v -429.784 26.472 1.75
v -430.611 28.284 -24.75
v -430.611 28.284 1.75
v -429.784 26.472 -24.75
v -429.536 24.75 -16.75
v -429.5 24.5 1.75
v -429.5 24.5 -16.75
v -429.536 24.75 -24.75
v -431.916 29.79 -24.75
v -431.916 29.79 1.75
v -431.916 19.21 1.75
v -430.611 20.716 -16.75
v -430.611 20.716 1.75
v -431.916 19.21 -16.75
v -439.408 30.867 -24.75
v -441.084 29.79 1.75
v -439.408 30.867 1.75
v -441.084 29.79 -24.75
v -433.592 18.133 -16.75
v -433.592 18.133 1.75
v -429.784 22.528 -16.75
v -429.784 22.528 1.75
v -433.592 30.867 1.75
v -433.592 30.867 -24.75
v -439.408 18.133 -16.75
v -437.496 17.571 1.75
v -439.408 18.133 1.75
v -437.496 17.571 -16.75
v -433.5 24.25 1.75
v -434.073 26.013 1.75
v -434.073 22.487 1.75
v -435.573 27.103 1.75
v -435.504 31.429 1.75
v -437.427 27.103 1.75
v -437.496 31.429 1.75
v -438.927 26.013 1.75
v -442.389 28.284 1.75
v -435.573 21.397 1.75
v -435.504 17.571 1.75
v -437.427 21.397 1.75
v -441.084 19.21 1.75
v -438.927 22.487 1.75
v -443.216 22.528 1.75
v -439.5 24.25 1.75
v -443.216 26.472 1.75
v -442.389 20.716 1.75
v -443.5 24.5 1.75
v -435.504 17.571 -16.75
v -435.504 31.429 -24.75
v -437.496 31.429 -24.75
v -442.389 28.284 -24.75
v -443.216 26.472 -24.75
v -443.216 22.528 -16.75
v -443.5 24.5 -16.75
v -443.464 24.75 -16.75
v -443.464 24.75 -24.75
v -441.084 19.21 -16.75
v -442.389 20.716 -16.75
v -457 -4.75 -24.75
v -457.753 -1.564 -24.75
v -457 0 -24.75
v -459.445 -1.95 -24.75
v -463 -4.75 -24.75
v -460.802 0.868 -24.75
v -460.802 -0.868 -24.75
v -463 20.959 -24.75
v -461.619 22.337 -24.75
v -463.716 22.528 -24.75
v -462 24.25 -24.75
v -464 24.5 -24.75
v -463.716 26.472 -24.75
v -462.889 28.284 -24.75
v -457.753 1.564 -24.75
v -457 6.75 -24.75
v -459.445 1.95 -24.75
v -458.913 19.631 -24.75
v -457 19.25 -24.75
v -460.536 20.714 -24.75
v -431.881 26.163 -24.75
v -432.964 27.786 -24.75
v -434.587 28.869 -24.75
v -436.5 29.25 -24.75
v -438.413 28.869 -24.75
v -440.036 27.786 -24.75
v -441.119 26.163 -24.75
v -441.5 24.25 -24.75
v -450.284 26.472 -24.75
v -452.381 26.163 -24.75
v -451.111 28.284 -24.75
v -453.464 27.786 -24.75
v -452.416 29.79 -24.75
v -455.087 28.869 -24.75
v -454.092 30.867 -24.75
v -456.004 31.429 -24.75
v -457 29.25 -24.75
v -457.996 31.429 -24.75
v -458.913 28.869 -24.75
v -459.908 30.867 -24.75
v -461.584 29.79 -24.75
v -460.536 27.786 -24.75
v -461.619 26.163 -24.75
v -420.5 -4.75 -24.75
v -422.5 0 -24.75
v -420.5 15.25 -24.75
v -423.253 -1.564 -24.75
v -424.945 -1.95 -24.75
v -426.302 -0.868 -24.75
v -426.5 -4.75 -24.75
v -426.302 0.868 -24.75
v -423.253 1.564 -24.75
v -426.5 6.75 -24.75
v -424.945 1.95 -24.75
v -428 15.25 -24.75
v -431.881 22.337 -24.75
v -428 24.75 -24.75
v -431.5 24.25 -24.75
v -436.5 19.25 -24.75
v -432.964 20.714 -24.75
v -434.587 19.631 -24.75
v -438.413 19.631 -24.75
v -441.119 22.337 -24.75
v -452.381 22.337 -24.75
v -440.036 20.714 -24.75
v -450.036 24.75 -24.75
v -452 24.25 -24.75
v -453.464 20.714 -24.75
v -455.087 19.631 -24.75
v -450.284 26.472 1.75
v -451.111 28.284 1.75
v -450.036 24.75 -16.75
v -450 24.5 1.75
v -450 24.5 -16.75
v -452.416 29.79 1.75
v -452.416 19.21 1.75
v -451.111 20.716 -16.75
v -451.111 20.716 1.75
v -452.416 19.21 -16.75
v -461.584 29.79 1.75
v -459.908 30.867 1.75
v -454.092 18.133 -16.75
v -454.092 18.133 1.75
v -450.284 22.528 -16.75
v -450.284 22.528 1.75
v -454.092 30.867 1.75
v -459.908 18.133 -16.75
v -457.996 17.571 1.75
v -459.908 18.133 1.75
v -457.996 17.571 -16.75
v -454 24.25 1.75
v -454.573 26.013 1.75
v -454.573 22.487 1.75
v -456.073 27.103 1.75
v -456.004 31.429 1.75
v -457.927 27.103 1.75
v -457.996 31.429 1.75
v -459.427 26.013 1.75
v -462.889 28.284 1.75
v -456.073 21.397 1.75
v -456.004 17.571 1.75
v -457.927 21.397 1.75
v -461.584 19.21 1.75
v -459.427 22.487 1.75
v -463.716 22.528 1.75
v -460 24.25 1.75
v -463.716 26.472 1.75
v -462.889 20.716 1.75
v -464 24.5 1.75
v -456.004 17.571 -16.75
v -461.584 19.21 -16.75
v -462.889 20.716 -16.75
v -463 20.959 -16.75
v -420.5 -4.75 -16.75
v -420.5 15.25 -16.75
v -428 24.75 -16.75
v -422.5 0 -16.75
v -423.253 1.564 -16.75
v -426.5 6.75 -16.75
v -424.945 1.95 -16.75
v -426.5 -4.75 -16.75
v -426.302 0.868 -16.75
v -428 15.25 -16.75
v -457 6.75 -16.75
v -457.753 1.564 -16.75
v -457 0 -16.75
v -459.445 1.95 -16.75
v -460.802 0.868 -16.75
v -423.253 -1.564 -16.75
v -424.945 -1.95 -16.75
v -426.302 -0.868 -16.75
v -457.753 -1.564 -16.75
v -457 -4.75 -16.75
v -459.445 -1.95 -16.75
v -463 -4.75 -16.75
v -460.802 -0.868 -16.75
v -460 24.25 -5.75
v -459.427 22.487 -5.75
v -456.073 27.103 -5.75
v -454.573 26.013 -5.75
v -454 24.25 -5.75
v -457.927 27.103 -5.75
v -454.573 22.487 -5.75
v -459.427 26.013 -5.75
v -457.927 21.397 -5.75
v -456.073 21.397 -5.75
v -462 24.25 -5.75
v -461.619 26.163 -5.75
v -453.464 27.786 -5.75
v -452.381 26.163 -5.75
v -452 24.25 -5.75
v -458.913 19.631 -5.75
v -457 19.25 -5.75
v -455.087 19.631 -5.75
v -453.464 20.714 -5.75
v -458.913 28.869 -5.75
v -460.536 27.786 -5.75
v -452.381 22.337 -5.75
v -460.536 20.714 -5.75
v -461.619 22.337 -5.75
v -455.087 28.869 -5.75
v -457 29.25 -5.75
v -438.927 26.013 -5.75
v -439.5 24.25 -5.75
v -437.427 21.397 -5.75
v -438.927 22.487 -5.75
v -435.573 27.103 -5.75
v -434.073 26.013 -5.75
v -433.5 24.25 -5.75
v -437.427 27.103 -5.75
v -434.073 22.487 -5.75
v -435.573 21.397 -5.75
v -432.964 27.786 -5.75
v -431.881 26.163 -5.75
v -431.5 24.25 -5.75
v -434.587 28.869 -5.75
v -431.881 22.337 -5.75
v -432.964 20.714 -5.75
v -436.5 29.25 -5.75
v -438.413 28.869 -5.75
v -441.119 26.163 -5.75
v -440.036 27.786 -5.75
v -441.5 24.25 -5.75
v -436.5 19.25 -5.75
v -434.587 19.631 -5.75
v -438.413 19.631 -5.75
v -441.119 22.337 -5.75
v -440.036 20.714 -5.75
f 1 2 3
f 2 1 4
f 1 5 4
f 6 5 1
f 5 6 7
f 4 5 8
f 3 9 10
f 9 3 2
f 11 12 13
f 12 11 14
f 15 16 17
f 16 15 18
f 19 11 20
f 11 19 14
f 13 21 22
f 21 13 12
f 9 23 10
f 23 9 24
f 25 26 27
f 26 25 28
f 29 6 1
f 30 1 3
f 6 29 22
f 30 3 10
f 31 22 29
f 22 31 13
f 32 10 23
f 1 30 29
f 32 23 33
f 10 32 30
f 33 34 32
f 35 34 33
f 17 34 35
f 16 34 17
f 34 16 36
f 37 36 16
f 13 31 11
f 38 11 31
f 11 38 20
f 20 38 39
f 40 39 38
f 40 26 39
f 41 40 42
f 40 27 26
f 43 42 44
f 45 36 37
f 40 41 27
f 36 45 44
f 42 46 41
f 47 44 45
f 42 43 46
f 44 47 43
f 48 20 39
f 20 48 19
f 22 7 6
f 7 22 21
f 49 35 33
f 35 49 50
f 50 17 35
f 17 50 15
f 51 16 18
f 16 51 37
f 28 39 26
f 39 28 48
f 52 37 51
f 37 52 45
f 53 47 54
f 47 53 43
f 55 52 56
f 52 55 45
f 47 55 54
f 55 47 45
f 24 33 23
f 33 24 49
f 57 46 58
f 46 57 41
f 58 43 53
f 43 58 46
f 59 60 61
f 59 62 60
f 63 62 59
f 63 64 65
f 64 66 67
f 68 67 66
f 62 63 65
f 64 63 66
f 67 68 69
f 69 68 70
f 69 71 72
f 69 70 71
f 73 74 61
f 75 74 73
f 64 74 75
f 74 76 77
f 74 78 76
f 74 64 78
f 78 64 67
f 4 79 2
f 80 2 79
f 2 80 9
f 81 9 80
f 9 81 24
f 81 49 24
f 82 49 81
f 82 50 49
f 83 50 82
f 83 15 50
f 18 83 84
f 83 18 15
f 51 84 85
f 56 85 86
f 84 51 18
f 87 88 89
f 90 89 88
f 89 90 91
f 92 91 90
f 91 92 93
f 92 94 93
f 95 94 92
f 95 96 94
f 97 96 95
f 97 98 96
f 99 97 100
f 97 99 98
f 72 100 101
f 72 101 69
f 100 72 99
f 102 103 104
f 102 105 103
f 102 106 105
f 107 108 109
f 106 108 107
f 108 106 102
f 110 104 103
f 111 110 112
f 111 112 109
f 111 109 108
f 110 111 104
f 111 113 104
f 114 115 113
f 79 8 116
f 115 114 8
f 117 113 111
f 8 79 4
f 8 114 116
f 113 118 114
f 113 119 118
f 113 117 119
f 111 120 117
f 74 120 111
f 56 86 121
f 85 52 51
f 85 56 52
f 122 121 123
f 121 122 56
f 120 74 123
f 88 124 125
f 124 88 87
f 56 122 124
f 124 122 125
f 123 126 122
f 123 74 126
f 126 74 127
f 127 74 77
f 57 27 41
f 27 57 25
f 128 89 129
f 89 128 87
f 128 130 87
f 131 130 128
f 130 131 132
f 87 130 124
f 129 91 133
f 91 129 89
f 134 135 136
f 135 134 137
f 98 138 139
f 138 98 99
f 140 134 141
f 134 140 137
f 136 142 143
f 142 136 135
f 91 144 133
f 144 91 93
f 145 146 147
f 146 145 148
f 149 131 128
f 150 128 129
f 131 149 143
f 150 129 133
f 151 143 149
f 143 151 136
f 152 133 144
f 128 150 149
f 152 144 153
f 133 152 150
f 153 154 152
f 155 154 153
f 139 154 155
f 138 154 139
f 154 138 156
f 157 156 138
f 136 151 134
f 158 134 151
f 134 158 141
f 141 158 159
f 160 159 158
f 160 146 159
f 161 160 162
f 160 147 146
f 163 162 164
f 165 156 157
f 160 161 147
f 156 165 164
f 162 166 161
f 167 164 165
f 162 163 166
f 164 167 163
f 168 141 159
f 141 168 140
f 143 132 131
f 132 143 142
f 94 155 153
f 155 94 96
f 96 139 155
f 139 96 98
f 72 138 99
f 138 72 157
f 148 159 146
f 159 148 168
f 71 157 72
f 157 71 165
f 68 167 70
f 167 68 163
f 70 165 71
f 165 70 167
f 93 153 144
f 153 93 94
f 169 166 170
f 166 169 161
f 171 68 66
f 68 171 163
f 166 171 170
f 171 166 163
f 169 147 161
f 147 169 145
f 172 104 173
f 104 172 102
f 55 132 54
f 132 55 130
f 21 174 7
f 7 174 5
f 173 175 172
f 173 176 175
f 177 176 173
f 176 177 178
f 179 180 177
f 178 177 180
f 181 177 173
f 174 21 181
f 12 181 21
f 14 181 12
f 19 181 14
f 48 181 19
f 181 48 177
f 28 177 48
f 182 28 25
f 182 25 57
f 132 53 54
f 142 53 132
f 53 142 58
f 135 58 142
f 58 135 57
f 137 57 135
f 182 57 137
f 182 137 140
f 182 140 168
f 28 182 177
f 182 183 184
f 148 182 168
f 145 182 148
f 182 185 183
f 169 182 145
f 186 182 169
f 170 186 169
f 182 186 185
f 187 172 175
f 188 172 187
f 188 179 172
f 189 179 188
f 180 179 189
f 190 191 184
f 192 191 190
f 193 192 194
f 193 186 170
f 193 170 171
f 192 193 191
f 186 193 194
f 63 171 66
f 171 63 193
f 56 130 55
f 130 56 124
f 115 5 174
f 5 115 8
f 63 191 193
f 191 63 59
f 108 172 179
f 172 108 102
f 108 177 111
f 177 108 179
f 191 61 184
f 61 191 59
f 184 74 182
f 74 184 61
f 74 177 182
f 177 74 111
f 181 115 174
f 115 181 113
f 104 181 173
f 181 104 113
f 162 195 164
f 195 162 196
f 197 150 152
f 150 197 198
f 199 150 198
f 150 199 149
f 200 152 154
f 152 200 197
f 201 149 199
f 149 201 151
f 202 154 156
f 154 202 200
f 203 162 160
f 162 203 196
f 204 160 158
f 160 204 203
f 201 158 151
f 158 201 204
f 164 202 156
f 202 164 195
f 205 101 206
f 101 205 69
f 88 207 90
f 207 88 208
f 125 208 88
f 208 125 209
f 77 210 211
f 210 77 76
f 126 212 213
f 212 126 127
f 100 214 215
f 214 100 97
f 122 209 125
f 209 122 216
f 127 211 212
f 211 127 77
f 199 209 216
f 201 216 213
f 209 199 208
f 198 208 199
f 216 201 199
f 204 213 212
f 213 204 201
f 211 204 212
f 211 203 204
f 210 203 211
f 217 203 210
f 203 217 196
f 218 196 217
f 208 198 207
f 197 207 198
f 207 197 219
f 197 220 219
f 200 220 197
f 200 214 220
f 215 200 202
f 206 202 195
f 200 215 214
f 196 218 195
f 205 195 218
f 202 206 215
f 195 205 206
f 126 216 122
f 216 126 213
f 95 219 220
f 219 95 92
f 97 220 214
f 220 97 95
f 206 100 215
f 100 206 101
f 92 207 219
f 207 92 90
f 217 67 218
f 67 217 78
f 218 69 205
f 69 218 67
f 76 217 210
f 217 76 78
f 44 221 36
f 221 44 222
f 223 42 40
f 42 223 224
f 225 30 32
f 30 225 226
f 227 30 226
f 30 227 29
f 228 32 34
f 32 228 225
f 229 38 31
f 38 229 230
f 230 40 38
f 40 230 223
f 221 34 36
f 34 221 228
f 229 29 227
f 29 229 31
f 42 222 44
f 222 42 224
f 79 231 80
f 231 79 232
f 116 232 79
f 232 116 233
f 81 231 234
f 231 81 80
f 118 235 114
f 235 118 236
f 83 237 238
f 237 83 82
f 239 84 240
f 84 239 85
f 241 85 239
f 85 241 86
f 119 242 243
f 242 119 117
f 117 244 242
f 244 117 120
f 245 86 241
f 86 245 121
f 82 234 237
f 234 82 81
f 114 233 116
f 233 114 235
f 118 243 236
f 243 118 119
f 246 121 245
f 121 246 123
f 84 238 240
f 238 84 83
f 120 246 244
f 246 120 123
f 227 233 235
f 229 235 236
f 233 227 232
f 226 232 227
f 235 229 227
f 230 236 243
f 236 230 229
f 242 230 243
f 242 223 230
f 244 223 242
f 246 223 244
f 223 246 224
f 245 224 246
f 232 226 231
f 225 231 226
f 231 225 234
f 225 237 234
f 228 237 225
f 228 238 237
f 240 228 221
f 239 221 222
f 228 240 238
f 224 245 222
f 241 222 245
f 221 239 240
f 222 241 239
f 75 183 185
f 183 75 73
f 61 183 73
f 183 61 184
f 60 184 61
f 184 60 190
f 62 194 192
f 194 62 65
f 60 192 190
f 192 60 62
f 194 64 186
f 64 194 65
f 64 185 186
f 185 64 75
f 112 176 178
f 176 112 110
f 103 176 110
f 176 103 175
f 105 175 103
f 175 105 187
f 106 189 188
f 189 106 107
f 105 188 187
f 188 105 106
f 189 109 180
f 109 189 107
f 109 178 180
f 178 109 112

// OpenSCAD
/*
cup_top_radius=46;
cup_bottom_radius=32;
cup_height=114;	
cup_lip=3;	
cup_lip_height=1.5;
cup_radius=cup_top_radius+cup_lip;
s_l=30.5;
s_h=30.5;
s_w=13.5;
s_o=0;
s_r=5;
s_p=7; //offset of pivot point in servo
s_ph=s_p; //servo pivot height

screw_r=2;

horn_r1=2.7;
horn_r2=4.6;
horn_c=2.5;
horn_height=5;
horn_arm=15;*/

cup_top_radius=56;
cup_bottom_radius=32;
cup_height=114;	
cup_lip=3;	
cup_lip_height=0.5;
cup_radius=cup_top_radius+cup_lip;

//s90
/*
s_l=24.5;
s_h=30.5;
s_w=13.5;
s_o=0;
s_r=5;
s_p=7; //offset of pivot point in servo
s_ph=s_p; //servo pivot height


horn_r1=2;
horn_r2=3.9;
horn_c=2.5;
horn_height=5;
horn_arm=13.5;
*/


s_l=30.5;
s_h=30.5;
s_w=13.5;
s_o=0;
s_r=5;
s_p=7; //offset of pivot point in servo
s_ph=s_p; //servo pivot height

horn_r1=2.7;
horn_r2=4.6;
horn_c=2.5;
horn_height=5;
horn_arm=15;

screw_r=3;


module servo() {
    color("black") {
        translate([-s_p,-s_w/2,-s_h-s_ph]) { 
            cube([s_l,s_w,s_h]);
            translate([s_p,s_w/2,s_h]) cylinder(h=s_ph,r1=s_r,r2=s_r);
        }
    }
}

module horn() {
	translate([0,0,-horn_height+horn_c]) {
        hull() {
            translate([-horn_arm-3,0,0]) cylinder(h=horn_height-horn_c,r1=horn_r1,r2=horn_r1);
            translate([horn_arm+3,0,0]) cylinder(h=horn_height-horn_c,r1=horn_r1,r2=horn_r1);
            cylinder(h=horn_height-horn_c,r1=horn_r2,r2=horn_r2);
        }
	}
	translate([0,0,-horn_height]) cylinder(h=horn_height,r1=horn_r2,r2=horn_r2);
}

module ir_sensor_mount2(r=0) {
ir_spacing=36;
ir_width=8;
ir_height=35;
    //top
    difference() {
    rotate([0,r,0])  difference() {
        hull() {
            translate([0,-5,0]) cube([5,10,10]);
            translate([0,-ir_spacing/2-ir_width,ir_height]) cube([5,ir_spacing+2*ir_width,10]);
        }
        //screw holes
        translate([0,ir_spacing/2,ir_spacing+2.5]) rotate([0,90,0]) cylinder(h=50,r1=screw_r-1,r2=screw_r-1);
        translate([0,-ir_spacing/2,ir_spacing+2.5]) rotate([0,90,0]) cylinder(h=50,r1=screw_r-1,r2=screw_r-1);
    }
    
    translate([-10,-10,-10]) cube([20,20,10]);
    }
    //base
    difference() {
        translate([-15,-20,0]) cube([20,40,5]);
        translate([-7,ir_spacing/2-5,-10]) cylinder(h=50,r1=screw_r-1,r2=screw_r-1);
        translate([-7,-(ir_spacing/2-5),-10]) cylinder(h=50,r1=screw_r-1,r2=screw_r-1);
    }
}

module ir_sensor_mount() {
ir_spacing=36;
ir_width=8;
ir_height=35;
difference() {
        union() {
            translate([-3,0,-15]) rotate([0,30,0]) translate([-ir_height+10,-ir_spacing/2-ir_width,0]) cube([ir_height,ir_spacing+2*ir_width,10]);
            translate([-ir_height+10,-ir_spacing/2-ir_width,-ir_width*4]) cube([10,ir_spacing+2*ir_width,ir_width*4]);
        }
        union() {
            //wire spacing
            translate([-ir_height+10,0,-20]) cylinder(h=50,r1=13,r2=13);
            //anchors to toilet
            translate([-40,20,-ir_width*3]) rotate([0,90,0]) cylinder(h=30,r1=screw_r-1,r2=screw_r-1);
            translate([-40,-20,-ir_width*3]) rotate([0,90,0]) cylinder(h=30,r1=screw_r-1,r2=screw_r-1);
            translate([0,ir_spacing/2,-1-15]) rotate([0,30,0]) translate([0,0,-10]) cylinder(h=50,r1=screw_r-1,r2=screw_r-1);
            translate([0,-ir_spacing/2,-1-15])  rotate([0,30,0])  translate([0,0,-10]) cylinder(h=50,r1=screw_r-1,r2=screw_r-1);
        }
}
}

module servo_clamp(clamp_height=15,clamp_width=10) {
    wiggle=3;   
    difference() {
        difference() {
            color("thistle") {
                translate([-s_p-clamp_width+(s_l+clamp_width*2)/2,-5-s_w/2+(s_w+clamp_width-5)/2,-s_h/2-s_ph-clamp_height/2]) translate([0,20+7,clamp_height-wiggle]) {
                    union() {
                        translate([s_l/2-10,0,-(clamp_height-wiggle-4-1)]) cylinder(h=clamp_height+cup_lip_height+wiggle+clamp_height-wiggle-4,r1=7,r2=7);
                        translate([-s_l/2,0,-(clamp_height-wiggle-4-1)]) cylinder(h=clamp_height+cup_lip_height+wiggle+clamp_height-wiggle-4,r1=7,r2=7);
                    }
                }
                translate([-s_p-clamp_width,-s_w/2,-s_h/2-s_ph-clamp_height/2+1]) { 
                    //translate([0,20+7,clamp_height-wiggle]) cube([s_l+clamp_width*2,s_w+clamp_width-5,clamp_height+cup_lip_height+wiggle]);
                    translate([4,2,4]) cube([s_l+clamp_width*2-8,s_w+clamp_width+30-8-9-2-5,clamp_height-wiggle-4]);
                }
            }
            rotate([0,0,0]) servo();
                         
    translate([-s_p-clamp_width,-s_w/2,-s_h/2-s_ph-clamp_height/2]) { 
                    //translate([0,20+7,clamp_height-wiggle]) cube([s_l+clamp_width*2,s_w+clamp_width-5,clamp_height+cup_lip_height+wiggle]);
                    translate([4+35,2+20,4]) cube([10,25,clamp_height-wiggle-4+2]);
                }
        }
        union () {
            translate([-s_p-clamp_width+10,-s_w/2+36-5,-s_h/2-s_ph-clamp_height/2-1]) cylinder(h=50,r1=screw_r,r2=screw_r);
            translate([-s_p-clamp_width+10,-s_w/2+36-5,-s_h/2-s_ph-clamp_height/2-1-25]) cylinder(h=50,r1=screw_r+2,r2=screw_r+2); //bigger hole
            translate([-s_p-clamp_width+(s_l+clamp_width*2)-10-10,-s_w/2+36-5,-s_h/2-s_ph-clamp_height/2-1]) cylinder(h=50,r1=screw_r,r2=screw_r);
            translate([-s_p-clamp_width+(s_l+clamp_width*2)-10-10,-s_w/2+36-5,-s_h/2-s_ph-clamp_height/2-1-25]) cylinder(h=50,r1=screw_r+2,r2=screw_r+2);
            
            translate([-s_p-clamp_width+10-2,0,-s_h/2-s_ph-clamp_height/2-1]) cylinder(h=50,r1=screw_r-1,r2=screw_r-1);
            translate([-s_p-clamp_width+(s_l+clamp_width*2)-10+2,0,-s_h/2-s_ph-clamp_height/2-1]) cylinder(h=50,r1=screw_r-1,r2=screw_r-1);
        }
    }
}

module cup() {
        union() {
            color("red") {
                translate([0,0,-cup_height-cup_lip_height]) {
                        cylinder(h = cup_height, r1 = cup_bottom_radius, r2 = cup_top_radius);
                }
            }   
            color("white") {
                translate([0,0,-cup_lip_height]) cylinder(h = cup_lip_height, r1 = cup_top_radius+cup_lip, r2 = cup_top_radius+cup_lip);
            }
        }   
}


module cup_holder(width=5,nipple=15) {
    color("blue") {
	difference() {
		union() {
			difference() {
				translate([-horn_arm,-horn_r2/2-5,-horn_height]) cube([(horn_arm+5)*2,horn_r2+10,horn_height]);
				horn();
			}
			difference() {
				hull() {
					translate([horn_arm+5+horn_r1+cup_radius,0,0]) {
						translate([0,0,-5]) cylinder(h=5,r1=cup_top_radius+width,r2=cup_top_radius+width);
					}
					//the servo square
					translate([-horn_arm,-horn_r2/2-5,-horn_height]) cube([(horn_arm+5)*2,horn_r2+10,horn_height]);
					//nipple on far side
					translate([horn_arm+5+horn_r1+cup_radius+cup_top_radius,0,-5]) cube([nipple,10,5]);
				}
				//the servo square
				translate([-horn_arm,-horn_r2/2-5,-horn_height]) cube([(horn_arm+5)*2,horn_r2+10,horn_height]);
			} 
		}
        translate([horn_arm+5+horn_r1+cup_radius,0,0]) translate([0,0,-cup_height+cup_lip_height]) cylinder(h=cup_height,r1=cup_top_radius+1.5,r2=cup_top_radius+1.5);
		//translate([(sqrt(2))*cup_radius,0,0]) translate([0,0,cup_lip_height]) cup();
	}
}
	
}


outter_orbit_radius=(1+sqrt(2))*cup_radius;
inner_orbit_radius=(sqrt(2)-1)*cup_radius;
module orbit(radiusx=5) {
	intersection() {
		difference() {
			difference() {
				cylinder(h=5,r1=radiusx+1,r2=radiusx+1);
				translate([-radiusx,0,0]) cube([2*radiusx+1,radiusx+1,5]);
			}
			{
				translate([0,0,-1]) cylinder(h=5+2,r1=radiusx-1,r2=radiusx-1);
			}
		}
		rotate([0,0,-135]) cube([radiusx+10,radiusx+10,5]);
	}
}
//orbit(outter_orbit_radius);
//orbit(inner_orbit_radius);


module rail(rail_height=5,inner_r=10,outter_r=20) {
        color("Teal") {
		difference() {
			difference() {
				cylinder(h=rail_height,r1=outter_r,r2=outter_r);
				translate([-outter_r,0,-1]) cube([2*outter_r,outter_r,rail_height+2]);
			}
			{
				translate([0,0,-1]) cylinder(h=rail_height+2,r1=inner_r,r2=inner_r);
			}
		}
    }
}



module seat() {
    translate([0,0,-20]) {
        difference() {
            scale([1,2/3,1]) scale([1.5,1.5,1]) cylinder(h=20,r1=300,r2=300);
            scale([1,2/3,1]) translate([0,0,-1]) cylinder(h=22,r1=300,r2=300);
        }
    }
}

module cover() {
    difference() {
        scale([1,2/3,1]) scale([1.5,1.5,1]) cylinder(h=20,r1=300,r2=300);
        translate([-cup_radius,-cup_radius,-1]) {
            cylinder(h=22,r1=cup_radius,r2=cup_radius);
        }
    }
}



        //outter rail
	    offset=13;
        //bottom rail part
        
        screwA=-15;
        screwB=-70;
        screwA=-0;
        screwB=-10;
       // screwB=15;
rotate([0,0,0]) {
    translate([-450,0,0]) {
        //%cover();
        //stepper
        //ir_sensor_mount2(25);
        //rotate([0,-90,0]) ir_sensor_mount();
        rotate([0,0,0]) { 
            //servo();
            servo_clamp();
        }
        echo($t/100);
        
        //rotate([0,0,(-$t*90)]) {
        rotate([0,0,(-70)]) {
            rotate([0,0,-45]) {
                //cup_holder(width=8,nipple=15);
            }
            translate([0,-cup_radius,0]){
                //translate([cup_radius,0,cup_lip]) cup();
            }
        }
        
        /*difference() {
            union() {
                translate([0,0,-5-5]) rail(rail_height=5,inner_r=cup_top_radius+sqrt(2)*cup_radius,outter_r=cup_top_radius+sqrt(2)*cup_radius+20);
            }
            union() {
                rotate([0,0,screwA]) translate([0,-(cup_top_radius+sqrt(2)*cup_radius+offset),-10]) cylinder(h=5+cup_lip_height+1.3+5,r1=screw_r,r2=screw_r);
                rotate([0,0,screwB]) translate([0,-(cup_top_radius+sqrt(2)*cup_radius+offset),-10]) cylinder(h=5+cup_lip_height+1.3+5,r1=screw_r,r2=screw_r);
                    rotate([0,0,0]) translate([20,-(cup_top_radius+sqrt(2)*cup_radius+offset)-20,-11]) cube([1000,1000,1000]);
            }
        }*/
        //screw tops
		
        /*difference() {
            union() {
                    rotate([0,0,screwA]) translate([0,-(cup_top_radius+sqrt(2)*cup_radius+offset),-10+5]) cylinder(h=5+cup_lip_height+1.7,r1=screw_r+3.5,r2=screw_r+3.5);
                    rotate([0,0,screwB]) translate([0,-(cup_top_radius+sqrt(2)*cup_radius+offset),-10+5]) cylinder(h=5+cup_lip_height+1.7,r1=screw_r+3.5,r2=screw_r+3.5);
            }
            union() {
                rotate([0,0,screwA]) translate([0,-(cup_top_radius+sqrt(2)*cup_radius+offset),-10+5]) cylinder(h=5+cup_lip_height+1.7,r1=screw_r,r2=screw_r);
                rotate([0,0,screwB]) translate([0,-(cup_top_radius+sqrt(2)*cup_radius+offset),-10+5]) cylinder(h=5+cup_lip_height+1.7,r1=screw_r,r2=screw_r);
            }
        }*/
        
   }
}
    translate([-450,0,0]) {
        //%seat();
        
    }
